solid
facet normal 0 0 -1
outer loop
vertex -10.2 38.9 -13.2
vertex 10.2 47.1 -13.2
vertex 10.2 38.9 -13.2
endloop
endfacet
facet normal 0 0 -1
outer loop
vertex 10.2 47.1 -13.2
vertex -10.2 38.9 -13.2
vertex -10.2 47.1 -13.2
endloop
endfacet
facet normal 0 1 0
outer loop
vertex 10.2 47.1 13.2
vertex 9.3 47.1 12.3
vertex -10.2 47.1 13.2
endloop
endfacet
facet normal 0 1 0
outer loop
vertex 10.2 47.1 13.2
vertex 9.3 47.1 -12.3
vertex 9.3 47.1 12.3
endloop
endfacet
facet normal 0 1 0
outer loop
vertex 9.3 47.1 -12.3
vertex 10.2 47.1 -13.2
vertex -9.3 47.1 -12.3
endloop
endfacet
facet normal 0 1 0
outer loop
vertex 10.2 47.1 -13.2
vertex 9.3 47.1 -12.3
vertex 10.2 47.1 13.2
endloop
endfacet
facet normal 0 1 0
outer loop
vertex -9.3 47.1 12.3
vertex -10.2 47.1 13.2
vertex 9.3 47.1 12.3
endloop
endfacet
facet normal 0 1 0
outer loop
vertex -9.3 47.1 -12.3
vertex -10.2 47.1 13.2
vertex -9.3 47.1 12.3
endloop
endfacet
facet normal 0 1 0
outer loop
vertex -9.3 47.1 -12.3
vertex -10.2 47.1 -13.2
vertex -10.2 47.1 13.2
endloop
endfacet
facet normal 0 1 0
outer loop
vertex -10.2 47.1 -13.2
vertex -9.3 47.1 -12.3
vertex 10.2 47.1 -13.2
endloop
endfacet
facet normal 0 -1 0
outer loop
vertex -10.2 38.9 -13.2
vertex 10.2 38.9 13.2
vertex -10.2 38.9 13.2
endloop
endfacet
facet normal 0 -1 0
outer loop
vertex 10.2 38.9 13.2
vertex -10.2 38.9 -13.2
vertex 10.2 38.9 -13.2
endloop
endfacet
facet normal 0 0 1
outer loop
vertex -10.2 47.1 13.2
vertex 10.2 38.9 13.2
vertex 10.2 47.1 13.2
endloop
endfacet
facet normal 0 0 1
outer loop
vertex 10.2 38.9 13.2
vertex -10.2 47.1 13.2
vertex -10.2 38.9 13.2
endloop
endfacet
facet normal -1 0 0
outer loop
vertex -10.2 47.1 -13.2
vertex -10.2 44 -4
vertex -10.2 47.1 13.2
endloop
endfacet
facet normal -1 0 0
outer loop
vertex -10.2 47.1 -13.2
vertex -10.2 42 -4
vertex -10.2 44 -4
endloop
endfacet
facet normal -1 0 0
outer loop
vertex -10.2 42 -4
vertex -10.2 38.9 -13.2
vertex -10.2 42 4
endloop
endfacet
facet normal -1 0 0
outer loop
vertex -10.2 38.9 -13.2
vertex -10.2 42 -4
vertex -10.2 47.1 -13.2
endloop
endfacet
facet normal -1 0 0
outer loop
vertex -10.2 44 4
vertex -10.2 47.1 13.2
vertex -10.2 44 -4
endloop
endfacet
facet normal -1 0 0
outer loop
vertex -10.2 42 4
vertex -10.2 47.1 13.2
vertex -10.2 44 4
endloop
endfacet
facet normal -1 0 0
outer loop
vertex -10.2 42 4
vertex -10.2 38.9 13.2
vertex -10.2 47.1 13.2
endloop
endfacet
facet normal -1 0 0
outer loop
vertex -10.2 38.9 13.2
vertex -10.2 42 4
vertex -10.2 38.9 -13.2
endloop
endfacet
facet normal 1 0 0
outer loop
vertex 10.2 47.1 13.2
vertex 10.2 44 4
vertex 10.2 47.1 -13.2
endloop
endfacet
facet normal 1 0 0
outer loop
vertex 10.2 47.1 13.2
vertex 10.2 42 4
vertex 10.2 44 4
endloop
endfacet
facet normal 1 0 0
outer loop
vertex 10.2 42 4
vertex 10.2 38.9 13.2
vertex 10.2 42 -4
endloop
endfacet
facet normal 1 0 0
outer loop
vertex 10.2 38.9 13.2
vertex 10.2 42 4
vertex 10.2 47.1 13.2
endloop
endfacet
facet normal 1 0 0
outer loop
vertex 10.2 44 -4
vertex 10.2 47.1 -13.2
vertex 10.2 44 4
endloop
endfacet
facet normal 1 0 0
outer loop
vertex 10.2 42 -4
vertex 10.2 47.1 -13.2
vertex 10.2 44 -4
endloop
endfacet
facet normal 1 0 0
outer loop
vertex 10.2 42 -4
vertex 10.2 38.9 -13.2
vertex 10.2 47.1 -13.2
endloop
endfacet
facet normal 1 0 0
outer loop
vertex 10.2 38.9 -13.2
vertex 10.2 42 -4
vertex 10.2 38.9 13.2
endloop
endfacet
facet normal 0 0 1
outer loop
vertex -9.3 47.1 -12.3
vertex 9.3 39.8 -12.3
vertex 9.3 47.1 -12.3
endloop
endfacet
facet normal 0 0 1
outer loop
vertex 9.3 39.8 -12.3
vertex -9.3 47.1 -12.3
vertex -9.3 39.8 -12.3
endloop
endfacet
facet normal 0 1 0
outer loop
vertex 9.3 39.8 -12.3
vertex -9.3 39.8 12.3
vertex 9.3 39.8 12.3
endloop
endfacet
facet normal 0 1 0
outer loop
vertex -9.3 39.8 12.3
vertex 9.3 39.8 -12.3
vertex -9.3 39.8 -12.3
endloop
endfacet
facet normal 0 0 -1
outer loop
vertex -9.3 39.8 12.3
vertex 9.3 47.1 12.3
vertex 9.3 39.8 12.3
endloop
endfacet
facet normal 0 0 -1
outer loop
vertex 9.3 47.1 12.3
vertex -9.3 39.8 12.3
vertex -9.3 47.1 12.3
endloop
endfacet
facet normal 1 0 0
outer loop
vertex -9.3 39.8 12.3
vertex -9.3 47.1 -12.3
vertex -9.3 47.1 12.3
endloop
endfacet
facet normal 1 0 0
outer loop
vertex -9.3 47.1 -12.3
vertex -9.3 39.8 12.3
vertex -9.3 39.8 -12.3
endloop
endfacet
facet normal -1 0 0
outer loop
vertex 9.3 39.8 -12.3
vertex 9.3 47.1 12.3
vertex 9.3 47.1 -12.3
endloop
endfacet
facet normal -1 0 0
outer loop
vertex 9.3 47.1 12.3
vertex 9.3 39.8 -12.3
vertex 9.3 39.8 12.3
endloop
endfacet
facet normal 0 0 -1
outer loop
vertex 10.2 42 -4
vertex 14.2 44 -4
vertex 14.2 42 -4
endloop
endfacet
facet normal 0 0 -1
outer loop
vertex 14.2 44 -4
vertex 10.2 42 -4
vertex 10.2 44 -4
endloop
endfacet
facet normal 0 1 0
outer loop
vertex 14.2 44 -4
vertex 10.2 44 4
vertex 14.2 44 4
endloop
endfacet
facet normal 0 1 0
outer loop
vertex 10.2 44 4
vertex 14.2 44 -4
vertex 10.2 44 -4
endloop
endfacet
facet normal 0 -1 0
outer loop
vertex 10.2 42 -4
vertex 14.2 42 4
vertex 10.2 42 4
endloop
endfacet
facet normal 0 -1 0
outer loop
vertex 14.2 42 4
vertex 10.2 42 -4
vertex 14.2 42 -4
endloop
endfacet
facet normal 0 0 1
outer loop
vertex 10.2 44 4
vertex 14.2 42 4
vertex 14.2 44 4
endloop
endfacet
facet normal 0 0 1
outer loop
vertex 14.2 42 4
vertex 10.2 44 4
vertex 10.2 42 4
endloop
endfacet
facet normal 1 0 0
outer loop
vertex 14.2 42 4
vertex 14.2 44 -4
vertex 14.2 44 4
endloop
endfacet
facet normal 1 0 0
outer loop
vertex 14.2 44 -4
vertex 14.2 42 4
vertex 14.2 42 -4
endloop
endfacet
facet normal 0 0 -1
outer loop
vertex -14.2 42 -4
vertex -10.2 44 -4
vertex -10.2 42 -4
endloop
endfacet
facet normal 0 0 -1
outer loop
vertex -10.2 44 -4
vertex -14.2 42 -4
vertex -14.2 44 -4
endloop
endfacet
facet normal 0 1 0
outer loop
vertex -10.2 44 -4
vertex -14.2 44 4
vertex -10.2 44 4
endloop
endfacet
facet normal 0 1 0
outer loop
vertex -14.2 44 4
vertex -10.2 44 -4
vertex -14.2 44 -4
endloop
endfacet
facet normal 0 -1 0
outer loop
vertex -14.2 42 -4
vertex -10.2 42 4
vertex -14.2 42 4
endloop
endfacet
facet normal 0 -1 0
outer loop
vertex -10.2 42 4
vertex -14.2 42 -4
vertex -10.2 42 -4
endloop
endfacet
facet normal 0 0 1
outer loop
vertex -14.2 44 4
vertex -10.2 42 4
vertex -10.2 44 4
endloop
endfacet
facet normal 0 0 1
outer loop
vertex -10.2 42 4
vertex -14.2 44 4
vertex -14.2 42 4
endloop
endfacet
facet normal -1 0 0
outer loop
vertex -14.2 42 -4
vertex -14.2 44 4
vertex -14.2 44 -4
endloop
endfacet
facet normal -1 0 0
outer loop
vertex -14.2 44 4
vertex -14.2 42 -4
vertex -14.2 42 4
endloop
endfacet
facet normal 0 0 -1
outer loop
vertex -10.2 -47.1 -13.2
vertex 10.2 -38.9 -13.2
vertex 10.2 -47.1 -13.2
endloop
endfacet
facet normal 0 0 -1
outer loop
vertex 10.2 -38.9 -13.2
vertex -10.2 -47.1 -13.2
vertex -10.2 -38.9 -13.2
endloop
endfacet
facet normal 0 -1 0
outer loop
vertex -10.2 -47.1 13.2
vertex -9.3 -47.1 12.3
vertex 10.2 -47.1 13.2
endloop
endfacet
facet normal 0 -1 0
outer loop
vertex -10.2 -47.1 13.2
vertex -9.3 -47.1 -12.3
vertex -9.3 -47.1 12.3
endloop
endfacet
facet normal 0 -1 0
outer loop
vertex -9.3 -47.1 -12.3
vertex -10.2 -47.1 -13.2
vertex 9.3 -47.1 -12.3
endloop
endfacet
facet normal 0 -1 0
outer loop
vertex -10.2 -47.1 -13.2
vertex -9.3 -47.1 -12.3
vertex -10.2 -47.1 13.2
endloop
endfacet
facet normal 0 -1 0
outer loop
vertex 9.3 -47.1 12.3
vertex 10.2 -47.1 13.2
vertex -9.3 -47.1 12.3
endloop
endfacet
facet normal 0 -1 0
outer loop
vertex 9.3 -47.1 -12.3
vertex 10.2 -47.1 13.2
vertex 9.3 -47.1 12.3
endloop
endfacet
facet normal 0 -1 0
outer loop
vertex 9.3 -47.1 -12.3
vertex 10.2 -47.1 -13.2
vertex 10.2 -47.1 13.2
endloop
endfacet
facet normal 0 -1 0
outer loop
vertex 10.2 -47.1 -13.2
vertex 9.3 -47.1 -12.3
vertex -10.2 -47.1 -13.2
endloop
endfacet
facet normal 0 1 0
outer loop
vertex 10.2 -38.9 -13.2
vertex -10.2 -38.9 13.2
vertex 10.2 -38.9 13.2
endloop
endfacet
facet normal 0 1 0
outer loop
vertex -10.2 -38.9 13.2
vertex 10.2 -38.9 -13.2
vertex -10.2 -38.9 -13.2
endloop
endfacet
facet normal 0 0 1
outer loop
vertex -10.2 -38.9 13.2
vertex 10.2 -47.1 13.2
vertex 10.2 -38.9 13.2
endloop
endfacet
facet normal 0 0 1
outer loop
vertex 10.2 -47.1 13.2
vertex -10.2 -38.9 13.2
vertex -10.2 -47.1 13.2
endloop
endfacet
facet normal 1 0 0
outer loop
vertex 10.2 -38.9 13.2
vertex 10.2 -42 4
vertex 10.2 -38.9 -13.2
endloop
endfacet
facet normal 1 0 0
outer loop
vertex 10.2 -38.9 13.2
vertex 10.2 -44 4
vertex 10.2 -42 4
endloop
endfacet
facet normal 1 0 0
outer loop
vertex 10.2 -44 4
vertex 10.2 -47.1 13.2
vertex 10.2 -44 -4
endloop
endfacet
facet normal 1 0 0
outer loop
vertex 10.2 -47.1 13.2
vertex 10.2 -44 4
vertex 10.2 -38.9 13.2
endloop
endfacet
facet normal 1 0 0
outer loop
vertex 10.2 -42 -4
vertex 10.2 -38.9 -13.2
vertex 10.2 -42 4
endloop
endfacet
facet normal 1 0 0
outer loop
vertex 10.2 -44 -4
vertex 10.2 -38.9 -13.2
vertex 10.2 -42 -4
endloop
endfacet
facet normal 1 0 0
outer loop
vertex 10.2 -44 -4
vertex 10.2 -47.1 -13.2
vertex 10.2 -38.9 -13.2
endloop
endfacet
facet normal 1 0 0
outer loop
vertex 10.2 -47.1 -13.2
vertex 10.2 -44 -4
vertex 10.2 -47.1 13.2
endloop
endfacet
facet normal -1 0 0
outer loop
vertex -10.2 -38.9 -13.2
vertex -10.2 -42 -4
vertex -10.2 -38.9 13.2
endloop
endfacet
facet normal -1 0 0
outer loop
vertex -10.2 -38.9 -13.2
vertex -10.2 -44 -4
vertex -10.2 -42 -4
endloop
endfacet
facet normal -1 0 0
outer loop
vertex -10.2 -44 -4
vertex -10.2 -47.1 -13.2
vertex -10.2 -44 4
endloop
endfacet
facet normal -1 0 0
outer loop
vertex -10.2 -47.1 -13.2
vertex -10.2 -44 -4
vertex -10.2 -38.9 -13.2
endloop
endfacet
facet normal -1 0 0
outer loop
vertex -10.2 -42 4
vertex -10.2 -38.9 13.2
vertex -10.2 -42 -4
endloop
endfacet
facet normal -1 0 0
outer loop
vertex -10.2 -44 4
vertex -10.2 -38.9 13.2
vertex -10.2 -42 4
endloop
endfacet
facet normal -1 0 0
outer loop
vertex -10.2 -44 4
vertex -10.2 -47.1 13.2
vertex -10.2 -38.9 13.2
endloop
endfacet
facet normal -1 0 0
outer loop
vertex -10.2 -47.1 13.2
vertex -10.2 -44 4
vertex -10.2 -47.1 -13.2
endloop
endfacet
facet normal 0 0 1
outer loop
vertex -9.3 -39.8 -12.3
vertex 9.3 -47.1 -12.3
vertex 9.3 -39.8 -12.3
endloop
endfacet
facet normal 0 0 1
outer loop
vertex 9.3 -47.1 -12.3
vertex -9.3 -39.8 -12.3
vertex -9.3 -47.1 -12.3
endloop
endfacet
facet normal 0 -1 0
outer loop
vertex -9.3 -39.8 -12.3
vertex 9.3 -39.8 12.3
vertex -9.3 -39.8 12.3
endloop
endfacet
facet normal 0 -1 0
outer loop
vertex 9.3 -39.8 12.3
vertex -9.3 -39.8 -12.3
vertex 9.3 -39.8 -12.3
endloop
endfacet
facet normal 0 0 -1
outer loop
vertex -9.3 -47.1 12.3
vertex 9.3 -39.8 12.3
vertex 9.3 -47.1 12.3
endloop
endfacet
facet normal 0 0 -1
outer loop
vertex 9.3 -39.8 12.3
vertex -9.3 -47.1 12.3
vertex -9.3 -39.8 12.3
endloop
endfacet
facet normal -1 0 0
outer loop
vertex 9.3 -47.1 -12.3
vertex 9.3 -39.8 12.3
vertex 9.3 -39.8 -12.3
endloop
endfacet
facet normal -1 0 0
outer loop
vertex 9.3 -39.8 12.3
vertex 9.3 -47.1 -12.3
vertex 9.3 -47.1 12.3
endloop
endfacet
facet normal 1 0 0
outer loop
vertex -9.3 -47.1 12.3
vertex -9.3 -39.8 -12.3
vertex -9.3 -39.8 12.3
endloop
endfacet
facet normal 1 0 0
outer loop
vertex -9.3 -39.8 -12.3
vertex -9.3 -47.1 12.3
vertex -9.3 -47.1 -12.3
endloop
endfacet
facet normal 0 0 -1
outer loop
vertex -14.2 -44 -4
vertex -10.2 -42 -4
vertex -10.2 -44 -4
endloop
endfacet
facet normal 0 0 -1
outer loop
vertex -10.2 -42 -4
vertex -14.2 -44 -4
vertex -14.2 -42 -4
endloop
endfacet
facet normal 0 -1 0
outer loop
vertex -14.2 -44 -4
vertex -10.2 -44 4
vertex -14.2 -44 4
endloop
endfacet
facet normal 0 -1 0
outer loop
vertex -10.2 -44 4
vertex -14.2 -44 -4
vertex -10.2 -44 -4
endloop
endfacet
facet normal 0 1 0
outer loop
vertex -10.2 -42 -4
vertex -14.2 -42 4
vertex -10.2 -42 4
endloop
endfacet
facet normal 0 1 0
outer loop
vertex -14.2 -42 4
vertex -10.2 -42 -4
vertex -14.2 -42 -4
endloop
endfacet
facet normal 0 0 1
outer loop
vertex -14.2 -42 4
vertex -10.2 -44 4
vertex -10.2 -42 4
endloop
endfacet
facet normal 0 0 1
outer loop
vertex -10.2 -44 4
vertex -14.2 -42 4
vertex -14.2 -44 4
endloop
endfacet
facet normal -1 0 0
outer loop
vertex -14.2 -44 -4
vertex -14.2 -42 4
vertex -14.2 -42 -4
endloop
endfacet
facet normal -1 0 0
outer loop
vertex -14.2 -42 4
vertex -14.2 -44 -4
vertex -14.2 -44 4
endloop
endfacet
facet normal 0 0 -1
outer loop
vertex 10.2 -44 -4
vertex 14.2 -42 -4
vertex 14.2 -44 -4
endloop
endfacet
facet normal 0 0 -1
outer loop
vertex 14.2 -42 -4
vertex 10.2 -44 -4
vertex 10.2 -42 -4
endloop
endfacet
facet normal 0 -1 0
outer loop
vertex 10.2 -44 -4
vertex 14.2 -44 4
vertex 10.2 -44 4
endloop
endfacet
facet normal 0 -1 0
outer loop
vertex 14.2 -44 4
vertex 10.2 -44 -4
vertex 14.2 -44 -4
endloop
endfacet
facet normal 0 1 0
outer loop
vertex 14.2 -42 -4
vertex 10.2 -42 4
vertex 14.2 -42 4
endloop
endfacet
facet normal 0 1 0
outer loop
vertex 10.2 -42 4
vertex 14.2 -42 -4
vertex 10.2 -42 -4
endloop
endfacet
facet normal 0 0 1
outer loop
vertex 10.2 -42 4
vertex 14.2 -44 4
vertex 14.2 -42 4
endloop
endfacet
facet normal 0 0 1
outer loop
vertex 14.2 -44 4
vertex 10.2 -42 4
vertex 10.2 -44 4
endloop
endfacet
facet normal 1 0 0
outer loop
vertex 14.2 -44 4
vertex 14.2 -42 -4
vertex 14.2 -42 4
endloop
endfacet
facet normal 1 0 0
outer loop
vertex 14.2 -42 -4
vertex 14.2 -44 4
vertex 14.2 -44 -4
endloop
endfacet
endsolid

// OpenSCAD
// file: 55_stage1_print_parameters.scad
/* BUDDY FILE 55 - STAGE 1 PRINT / INTERFACE PARAMETERS
All dimensions mm. Values marked PROCESS are starting points for calibration coupons. */
B1_OD=115; B1_CAVITY_D=111; B1_AIRWAY_D=70; B1_DUCT_OD=74;
B1_SHELL_R=B1_OD/2; B1_CAVITY_R=B1_CAVITY_D/2;
B1_WALL=2.0; B1_MIN_RIB=2.2; B1_MIN_WEB=1.2;
B1_FDM_SLIDE=0.30;       // PROCESS: per side, calibrate
B1_FDM_PRESS=0.10;       // PROCESS: per side, calibrate
B1_INSERT_OD=3.2;        // PLACEHOLDER for M2-class heat-set insert; replace from selected insert drawing
B1_M2_CLEAR=2.4;         // PROCESS starting clearance
B1_M2_HEAD=4.3;          // PLACEHOLDER head pocket
B1_M2_HEAD_H=1.8;
B1_POLAR_OPENING_D=74.8;
B1_CAMERA_DUCT_GAP=0.8; B1_CAMERA_SHELL_MARGIN=1.0;
B1_ROTOR_NOMINAL_R=34.6; B1_ROTOR_STATIC_RADIAL_GAP=B1_AIRWAY_D/2-B1_ROTOR_NOMINAL_R;
assert(B1_OD==115); assert(B1_CAVITY_D==111); assert(B1_AIRWAY_D==70);
assert(B1_POLAR_OPENING_D>B1_DUCT_OD);
assert(B1_ROTOR_STATIC_RADIAL_GAP>0);
echo("FILE55 Stage1 architecture OD/cavity/airway =",B1_OD,B1_CAVITY_D,B1_AIRWAY_D);
echo("PROCESS tolerances require calibration before production prints");
// main file
/* BUDDY FILE83 - OPPOSED BATTERY RETENTION V1
Parametric carrier concept; exact pack dimensions must come from selected cells/pack. */
include <55_stage1_print_parameters.scad>
$fn=64;
PACK=[24,18,7]; CLEAR=.6; WALL=1.2; R=43;
module tray(){
 difference(){
  cube([PACK[0]+2*WALL,PACK[1]+2*WALL,PACK[2]+WALL],center=true);
  translate([0,0,WALL/2])cube([PACK[0]+CLEAR,PACK[1]+CLEAR,PACK[2]+CLEAR],center=true);
 }
 // retention ears for strap/clip concept
 for(y=[-1,1])translate([0,y*(PACK[1]/2+WALL+2),0])cube([8,4,2],center=true);
}
module battery_pair(){for(a=[90,270])rotate([0,0,a])translate([R,0,0])rotate([0,90,0])tray();}
battery_pair();
assert(R-PACK[2]/2>B1_DUCT_OD/2,"battery pack intrudes into duct envelope");
echo("FILE83 opposed battery retention; PACK dimensions provisional",PACK);
